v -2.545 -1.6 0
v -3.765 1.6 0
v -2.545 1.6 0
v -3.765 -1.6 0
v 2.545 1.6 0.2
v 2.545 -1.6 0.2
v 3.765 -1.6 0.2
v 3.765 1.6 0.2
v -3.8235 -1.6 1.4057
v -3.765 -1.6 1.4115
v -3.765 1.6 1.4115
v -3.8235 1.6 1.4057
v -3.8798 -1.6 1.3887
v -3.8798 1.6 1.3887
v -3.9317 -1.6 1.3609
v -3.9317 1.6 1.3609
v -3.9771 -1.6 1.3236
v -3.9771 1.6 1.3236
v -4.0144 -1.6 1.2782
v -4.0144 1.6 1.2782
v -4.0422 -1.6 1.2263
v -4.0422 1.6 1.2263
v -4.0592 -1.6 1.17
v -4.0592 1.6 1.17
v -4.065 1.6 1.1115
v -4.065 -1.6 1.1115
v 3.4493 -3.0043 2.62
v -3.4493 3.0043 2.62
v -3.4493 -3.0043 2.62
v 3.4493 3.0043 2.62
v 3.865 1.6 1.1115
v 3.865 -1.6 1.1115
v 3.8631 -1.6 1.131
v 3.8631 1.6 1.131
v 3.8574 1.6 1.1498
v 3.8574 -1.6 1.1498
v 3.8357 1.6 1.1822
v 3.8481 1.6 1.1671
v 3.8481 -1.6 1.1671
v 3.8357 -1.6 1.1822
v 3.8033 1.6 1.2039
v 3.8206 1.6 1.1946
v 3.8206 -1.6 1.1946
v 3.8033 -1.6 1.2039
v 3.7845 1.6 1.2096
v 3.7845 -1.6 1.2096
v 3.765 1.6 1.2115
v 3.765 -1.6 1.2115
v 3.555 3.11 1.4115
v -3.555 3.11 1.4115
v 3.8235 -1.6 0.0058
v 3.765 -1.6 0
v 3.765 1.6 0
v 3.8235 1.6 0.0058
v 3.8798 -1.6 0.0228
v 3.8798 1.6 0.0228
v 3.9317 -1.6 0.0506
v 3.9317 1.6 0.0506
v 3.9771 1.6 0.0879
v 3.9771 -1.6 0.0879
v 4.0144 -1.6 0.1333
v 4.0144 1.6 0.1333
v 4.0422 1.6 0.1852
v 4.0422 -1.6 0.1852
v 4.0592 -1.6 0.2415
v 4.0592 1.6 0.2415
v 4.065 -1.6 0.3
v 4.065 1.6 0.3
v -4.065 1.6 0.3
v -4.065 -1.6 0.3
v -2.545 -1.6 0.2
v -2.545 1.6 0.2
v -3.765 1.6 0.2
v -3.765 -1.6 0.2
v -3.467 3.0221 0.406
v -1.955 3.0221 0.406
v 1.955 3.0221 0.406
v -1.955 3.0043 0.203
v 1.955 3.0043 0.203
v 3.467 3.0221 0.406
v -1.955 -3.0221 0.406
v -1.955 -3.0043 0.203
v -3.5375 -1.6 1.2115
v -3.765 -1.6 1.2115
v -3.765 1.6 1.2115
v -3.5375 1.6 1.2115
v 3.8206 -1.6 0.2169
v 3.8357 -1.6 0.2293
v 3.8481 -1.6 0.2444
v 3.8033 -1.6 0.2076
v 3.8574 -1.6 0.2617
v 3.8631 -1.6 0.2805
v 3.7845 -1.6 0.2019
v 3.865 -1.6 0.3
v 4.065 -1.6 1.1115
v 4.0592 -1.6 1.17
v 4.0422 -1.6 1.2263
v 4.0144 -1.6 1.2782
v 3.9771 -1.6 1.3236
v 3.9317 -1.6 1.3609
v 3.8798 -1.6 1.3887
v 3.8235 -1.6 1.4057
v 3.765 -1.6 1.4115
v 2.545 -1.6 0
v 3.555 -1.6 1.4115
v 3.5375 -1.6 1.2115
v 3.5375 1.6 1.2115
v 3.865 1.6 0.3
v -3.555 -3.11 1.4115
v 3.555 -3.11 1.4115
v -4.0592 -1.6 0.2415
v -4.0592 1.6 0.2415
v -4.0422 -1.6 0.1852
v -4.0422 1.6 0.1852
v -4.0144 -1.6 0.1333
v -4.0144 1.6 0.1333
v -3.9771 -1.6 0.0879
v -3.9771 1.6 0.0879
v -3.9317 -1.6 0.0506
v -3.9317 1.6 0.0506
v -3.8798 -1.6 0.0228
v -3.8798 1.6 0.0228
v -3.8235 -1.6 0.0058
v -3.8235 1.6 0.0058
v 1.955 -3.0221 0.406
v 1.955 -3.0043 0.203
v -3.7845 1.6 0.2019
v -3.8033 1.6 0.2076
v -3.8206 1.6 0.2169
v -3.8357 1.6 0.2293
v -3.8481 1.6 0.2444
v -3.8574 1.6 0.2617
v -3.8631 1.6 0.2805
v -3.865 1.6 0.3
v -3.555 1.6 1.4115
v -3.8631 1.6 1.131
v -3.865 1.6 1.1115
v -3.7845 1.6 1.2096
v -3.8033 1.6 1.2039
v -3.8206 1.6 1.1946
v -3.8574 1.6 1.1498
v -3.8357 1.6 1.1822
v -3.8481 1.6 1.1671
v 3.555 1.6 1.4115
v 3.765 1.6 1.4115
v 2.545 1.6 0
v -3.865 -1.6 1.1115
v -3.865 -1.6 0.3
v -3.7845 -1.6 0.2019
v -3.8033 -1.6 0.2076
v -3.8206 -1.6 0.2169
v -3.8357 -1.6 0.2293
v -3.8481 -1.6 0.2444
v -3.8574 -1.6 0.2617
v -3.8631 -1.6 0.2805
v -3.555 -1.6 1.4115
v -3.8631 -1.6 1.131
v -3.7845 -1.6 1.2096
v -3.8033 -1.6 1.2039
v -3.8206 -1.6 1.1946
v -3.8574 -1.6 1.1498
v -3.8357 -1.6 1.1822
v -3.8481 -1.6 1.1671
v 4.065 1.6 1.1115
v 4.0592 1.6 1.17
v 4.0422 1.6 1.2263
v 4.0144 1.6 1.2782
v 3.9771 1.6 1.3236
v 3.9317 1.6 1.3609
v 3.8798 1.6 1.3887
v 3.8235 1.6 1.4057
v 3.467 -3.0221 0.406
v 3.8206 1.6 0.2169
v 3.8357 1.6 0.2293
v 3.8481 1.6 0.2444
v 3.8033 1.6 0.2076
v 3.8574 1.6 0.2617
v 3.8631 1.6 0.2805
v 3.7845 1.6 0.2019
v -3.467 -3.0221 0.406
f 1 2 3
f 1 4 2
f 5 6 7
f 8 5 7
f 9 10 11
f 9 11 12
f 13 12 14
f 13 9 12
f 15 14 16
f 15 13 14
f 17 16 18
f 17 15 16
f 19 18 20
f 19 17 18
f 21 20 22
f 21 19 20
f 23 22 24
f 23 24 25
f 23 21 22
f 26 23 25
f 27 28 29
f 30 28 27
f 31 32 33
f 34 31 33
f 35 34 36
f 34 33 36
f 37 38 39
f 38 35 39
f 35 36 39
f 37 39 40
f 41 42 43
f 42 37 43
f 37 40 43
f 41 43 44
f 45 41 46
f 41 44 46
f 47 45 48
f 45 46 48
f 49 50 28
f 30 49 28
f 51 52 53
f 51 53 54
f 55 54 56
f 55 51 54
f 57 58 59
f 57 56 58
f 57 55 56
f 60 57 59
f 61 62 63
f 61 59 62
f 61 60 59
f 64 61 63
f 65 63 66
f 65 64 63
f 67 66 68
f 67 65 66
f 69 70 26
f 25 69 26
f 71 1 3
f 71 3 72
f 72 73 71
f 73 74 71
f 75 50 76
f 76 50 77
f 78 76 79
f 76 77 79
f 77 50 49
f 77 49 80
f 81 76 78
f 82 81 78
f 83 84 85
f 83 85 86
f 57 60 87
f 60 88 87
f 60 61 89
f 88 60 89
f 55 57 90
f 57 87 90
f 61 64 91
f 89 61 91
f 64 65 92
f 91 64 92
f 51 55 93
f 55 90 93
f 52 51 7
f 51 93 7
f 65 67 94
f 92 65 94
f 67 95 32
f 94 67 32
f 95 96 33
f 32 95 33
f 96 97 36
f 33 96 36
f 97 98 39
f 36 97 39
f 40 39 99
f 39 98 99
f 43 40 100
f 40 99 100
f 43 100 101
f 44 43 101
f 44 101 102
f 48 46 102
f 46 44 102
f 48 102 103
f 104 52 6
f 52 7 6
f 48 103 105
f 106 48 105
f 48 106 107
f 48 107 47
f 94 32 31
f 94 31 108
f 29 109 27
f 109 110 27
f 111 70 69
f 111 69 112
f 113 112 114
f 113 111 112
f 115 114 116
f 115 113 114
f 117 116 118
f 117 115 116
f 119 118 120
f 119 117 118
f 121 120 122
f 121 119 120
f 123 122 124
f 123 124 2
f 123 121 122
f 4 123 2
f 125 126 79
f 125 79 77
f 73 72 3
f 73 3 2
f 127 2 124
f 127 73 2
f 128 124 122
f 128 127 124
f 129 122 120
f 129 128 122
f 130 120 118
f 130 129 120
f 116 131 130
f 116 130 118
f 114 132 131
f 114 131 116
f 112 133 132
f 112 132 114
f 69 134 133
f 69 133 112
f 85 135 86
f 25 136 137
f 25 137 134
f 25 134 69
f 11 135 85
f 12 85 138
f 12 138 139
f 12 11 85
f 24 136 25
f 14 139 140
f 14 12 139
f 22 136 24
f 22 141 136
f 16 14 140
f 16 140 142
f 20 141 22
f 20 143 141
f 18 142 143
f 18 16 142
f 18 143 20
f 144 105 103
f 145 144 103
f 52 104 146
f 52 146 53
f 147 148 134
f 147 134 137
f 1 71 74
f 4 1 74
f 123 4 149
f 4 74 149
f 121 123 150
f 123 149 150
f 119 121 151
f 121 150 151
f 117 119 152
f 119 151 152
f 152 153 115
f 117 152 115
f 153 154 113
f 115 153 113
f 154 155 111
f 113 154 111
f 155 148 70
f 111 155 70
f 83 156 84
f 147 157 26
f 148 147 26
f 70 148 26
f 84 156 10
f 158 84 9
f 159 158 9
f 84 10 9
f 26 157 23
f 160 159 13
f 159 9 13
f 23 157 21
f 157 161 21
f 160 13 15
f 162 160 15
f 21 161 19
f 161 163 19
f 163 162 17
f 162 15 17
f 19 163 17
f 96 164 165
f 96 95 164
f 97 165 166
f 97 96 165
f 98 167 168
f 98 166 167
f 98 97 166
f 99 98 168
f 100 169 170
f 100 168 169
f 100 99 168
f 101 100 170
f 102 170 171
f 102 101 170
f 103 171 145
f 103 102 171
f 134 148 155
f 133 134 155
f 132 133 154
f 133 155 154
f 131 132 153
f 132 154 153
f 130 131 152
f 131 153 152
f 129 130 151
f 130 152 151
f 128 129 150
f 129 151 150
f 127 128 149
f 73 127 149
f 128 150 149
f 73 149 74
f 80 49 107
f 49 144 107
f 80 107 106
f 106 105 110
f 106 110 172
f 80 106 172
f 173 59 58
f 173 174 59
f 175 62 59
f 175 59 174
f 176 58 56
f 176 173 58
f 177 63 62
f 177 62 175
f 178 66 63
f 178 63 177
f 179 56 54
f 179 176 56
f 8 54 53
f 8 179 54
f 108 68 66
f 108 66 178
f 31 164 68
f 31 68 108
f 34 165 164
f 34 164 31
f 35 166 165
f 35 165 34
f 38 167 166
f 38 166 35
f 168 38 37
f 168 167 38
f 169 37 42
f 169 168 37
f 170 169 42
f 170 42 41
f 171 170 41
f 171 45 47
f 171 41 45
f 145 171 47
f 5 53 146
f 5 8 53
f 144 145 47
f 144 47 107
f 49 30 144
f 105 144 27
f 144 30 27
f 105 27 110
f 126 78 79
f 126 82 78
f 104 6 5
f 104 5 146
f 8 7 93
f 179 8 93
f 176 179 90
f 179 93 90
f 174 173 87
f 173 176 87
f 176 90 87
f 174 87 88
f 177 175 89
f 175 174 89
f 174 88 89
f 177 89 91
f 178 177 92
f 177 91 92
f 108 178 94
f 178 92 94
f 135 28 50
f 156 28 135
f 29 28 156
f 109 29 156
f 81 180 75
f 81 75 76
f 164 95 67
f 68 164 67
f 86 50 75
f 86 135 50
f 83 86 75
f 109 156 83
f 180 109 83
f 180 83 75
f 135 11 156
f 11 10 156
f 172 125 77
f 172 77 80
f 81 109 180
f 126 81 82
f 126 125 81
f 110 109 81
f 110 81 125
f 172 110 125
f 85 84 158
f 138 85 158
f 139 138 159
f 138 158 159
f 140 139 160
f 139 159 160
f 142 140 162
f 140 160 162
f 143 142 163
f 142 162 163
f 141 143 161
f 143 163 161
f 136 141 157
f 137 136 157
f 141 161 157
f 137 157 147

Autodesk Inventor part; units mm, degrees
sketch "Эскиз1" plane through (0, 0, 0) normal (0, 0, 1) x (1, 0, 0)
  line L0 (-3.555, 3.11) -> (3.555, 3.11)
  line L1 (3.555, 3.11) -> (3.555, -3.11)
  line L2 (3.555, -3.11) -> (-3.555, -3.11)
  line L3 (-3.555, -3.11) -> (-3.555, 3.11)
  point P0 (0, 0)
  dimension "d0" = 3.555
  dimension "d1" = 3.11
  dimension "d2" = 7.11
  dimension "d3" = 6.22
extrude "Выдавливание1" add sketch "Эскиз1" along normal blind 2.62
sketch "Эскиз4" plane through (-3.555, -3.11, 0) normal (0, -1, 0) x (1, 0, 0)
  line L0 (7.11, 2.62) -> (0, 2.62) projected
  line L1 (0, 0) -> (0, 2.62) projected
  line L2 (7.11, 0) -> (0, 0) projected
  line L3 (7.11, 0) -> (7.11, 2.62) projected
  line L4 (0.1057, 2.62) -> (0, 1.4115)
  line L5 (0, 1.4115) -> (0.088, 0.406)
  line L6 (7.0043, 2.62) -> (7.11, 1.4115)
  line L7 (7.11, 1.4115) -> (7.022, 0.406)
  line L8 (0.088, 0.406) -> (1.6, 0.406)
  line L9 (1.6, 0.406) -> (1.6, 0.203)
  line L10 (1.6, 0.203) -> (5.51, 0.203)
  line L11 (5.51, 0.203) -> (5.51, 0.406)
  line L12 (5.51, 0.406) -> (7.022, 0.406)
  point P0 (3.555, 0)
  dimension "d24" = 0.203
  dimension "d25" = 0.203
  dimension "d26" = 1.6
  dimension "d27" = 1.6
  dimension "d28" = 1.2085
  dimension "d29" = 1.2085
  dimension "d30" = 1.2085
  dimension "d31" = 1.2085
  dimension "d32" = 5
  dimension "d33" = 5
  dimension "d34" = 5
  dimension "d35" = 5
extrude "Выдавливание3" cut sketch "Эскиз4" against normal through all contours L3 L6 L0 | L3 L2 L1 L5 L8 L9 L10 L11 L12 L7 | L4 L1 L0
ref_plane "РабПлоскость1" through (3.555, 0, 1.4115) normal (1, 0, 0) x (0, 1, 0)
sketch "Эскиз5" plane through (3.555, 0, 1.4115) normal (1, 0, 0) x (0, 1, 0)
  line L0 (3.11, 1.2085) -> (3.11, 0) projected
  line L1 (-3.11, 1.2085) -> (3.11, 1.2085) projected
  line L2 (-3.11, 0) -> (-3.11, 1.2085) projected
  line L3 (-3.11, 0) -> (3.11, 0) projected
  line L4 (3.11, 0) -> (3.11, -1.0055) projected
  line L5 (-3.11, 0) -> (3.11, 0) projected
  line L6 (-3.11, -1.0055) -> (-3.11, 0) projected
  line L7 (-3.11, -1.0055) -> (3.11, -1.0055) projected
  line L8 (-3.11, 0) -> (-3.0043, 1.2085)
  line L9 (3.11, 0) -> (3.0043, 1.2085)
  line L10 (-3.0043, 1.2085) -> (-3.11, 1.2085)
  line L11 (-3.11, 1.2085) -> (-3.11, 0)
  line L12 (3.11, 0) -> (3.11, 1.2085)
  line L13 (3.11, 1.2085) -> (3.0043, 1.2085)
  line L14 (3.11, -1.0055) -> (3.11, -1.2085) projected
  line L15 (-3.11, -1.0055) -> (3.11, -1.0055) projected
  line L16 (-3.11, -1.2085) -> (-3.11, -1.0055) projected
  line L17 (-3.11, -1.2085) -> (3.11, -1.2085) projected
  line L18 (-3.11, 0) -> (-3.0043, -1.2085)
  line L19 (-3.0043, -1.2085) -> (-3.11, -1.2085)
  line L20 (-3.11, -1.2085) -> (-3.11, 0)
  line L21 (3.11, 0) -> (3.0043, -1.2085)
  line L22 (3.0043, -1.2085) -> (3.11, -1.2085)
  line L23 (3.11, -1.2085) -> (3.11, 0)
  point P0 (0, -1.4115)
  dimension "d39" = 5
  dimension "d40" = 5
  dimension "d43" = 5
  dimension "d44" = 5
extrude "Выдавливание4" cut sketch "Эскиз5" against normal through all contours L0 L9 L1 | L4 L7 L21 | L18 L7 L6 | L2 L1 L8 | L14 L17 L21 L7 | L7 L18 L17 L16
ref_plane "РабПлоскость10" through (3.555, 0, 1.4115) normal (0, 1, 0) x (-1, 0, 0)
ref_plane "РабПлоскость8" through (3.555, -3.11, 1.4115) normal (0, 1, 0) x (-1, 0, 0)
ref_plane "РабПлоскость9" through (0, 3.11, 1.4115) normal (0, 1, 0) x (-1, 0, 0)
sketch "Эскиз7" plane through (3.555, 0, 1.4115) normal (0, 1, 0) x (-1, 0, 0)
  line L0 (0.1057, 1.2085) -> (0, 0) projected
  line L1 (7.0043, 1.2085) -> (0.1057, 1.2085) projected
  line L2 (7.11, 0) -> (7.0043, 1.2085) projected
  line L3 (0, 0) -> (7.11, 0) projected
  line L4 (0, 0) -> (0.088, -1.0055) projected
  line L5 (0, 0) -> (7.11, 0) projected
  line L6 (7.022, -1.0055) -> (7.11, 0) projected
  line L7 (5.51, -1.0055) -> (7.022, -1.0055) projected
  line L8 (5.51, -1.2085) -> (5.51, -1.0055) projected
  line L9 (1.6, -1.2085) -> (5.51, -1.2085) projected
  line L10 (1.6, -1.0055) -> (1.6, -1.2085) projected
  line L11 (0.088, -1.0055) -> (1.6, -1.0055) projected
  line L12 (3.555, -1.4115) -> (3.555, 2.1644) construction
  line L13 (-0.51, -0.3) -> (-0.51, -1.1115)
  line L14 (1.01, -1.4115) -> (-0.21, -1.4115)
  line L15 (1.01, -1.2115) -> (1.01, -1.4115)
  line L16 (1.01, -1.2115) -> (-0.21, -1.2115)
  line L17 (0, 0) -> (-0.21, 0)
  line L18 (0, 0) -> (0.0175, -0.2)
  line L19 (0.0175, -0.2) -> (-0.21, -0.2)
  line L20 (-0.31, -0.3) -> (-0.31, -1.1115)
  arc A0 (-0.31, -1.1115) -> (-0.21, -1.2115) centre (-0.21, -1.1115) ccw
  arc A1 (-0.21, -0.2) -> (-0.31, -0.3) centre (-0.21, -0.3) ccw
  arc A2 (-0.51, -1.1115) -> (-0.21, -1.4115) centre (-0.21, -1.1115) ccw
  arc A3 (-0.21, 0) -> (-0.51, -0.3) centre (-0.21, -0.3) ccw
  line L21 (3.555, -1.4115) -> (1.6, -1.4115) construction
  dimension "d62" = 4.065
  dimension "d64" = 1.52
  dimension "d65" = 0.2
  dimension "d66" = 0.2
  dimension "d67" = 0.2
  dimension "d68" = 0.2
  dimension "d69" = 0.2
extrude "Выдавливание6" add sketch "Эскиз7" along normal mid plane 3.2 contours L4 L19 A1 L20 A0 L16 L15 L14 A2 L13 A3 L17
ref_plane "РабПлоскость13" through (0, -3.11, 1.4115) normal (-1, 0, 0) x (0, -1, 0)
ref_plane "РабПлоскость11" through (3.555, 0, 1.4115) normal (1, 0, 0) x (0, 1, 0)
ref_plane "РабПлоскость12" through (-3.555, -3.11, 1.4115) normal (-1, 0, 0) x (0, -1, 0)
mirror "Зеркальное отражение2" about plane through (0, -3.11, 1.4115) normal (-1, 0, 0) of "Выдавливание6"
equation "\"d0\" = 0.5 * d2"
equation "\"d1\" = 0.5 * d3"
equation "\"d25\" = d24"
equation "\"d27\" = d26"
equation "\"d28\" = d29"
equation "\"d30\" = d31"
properties part number "DO-214AB (SMC)"
